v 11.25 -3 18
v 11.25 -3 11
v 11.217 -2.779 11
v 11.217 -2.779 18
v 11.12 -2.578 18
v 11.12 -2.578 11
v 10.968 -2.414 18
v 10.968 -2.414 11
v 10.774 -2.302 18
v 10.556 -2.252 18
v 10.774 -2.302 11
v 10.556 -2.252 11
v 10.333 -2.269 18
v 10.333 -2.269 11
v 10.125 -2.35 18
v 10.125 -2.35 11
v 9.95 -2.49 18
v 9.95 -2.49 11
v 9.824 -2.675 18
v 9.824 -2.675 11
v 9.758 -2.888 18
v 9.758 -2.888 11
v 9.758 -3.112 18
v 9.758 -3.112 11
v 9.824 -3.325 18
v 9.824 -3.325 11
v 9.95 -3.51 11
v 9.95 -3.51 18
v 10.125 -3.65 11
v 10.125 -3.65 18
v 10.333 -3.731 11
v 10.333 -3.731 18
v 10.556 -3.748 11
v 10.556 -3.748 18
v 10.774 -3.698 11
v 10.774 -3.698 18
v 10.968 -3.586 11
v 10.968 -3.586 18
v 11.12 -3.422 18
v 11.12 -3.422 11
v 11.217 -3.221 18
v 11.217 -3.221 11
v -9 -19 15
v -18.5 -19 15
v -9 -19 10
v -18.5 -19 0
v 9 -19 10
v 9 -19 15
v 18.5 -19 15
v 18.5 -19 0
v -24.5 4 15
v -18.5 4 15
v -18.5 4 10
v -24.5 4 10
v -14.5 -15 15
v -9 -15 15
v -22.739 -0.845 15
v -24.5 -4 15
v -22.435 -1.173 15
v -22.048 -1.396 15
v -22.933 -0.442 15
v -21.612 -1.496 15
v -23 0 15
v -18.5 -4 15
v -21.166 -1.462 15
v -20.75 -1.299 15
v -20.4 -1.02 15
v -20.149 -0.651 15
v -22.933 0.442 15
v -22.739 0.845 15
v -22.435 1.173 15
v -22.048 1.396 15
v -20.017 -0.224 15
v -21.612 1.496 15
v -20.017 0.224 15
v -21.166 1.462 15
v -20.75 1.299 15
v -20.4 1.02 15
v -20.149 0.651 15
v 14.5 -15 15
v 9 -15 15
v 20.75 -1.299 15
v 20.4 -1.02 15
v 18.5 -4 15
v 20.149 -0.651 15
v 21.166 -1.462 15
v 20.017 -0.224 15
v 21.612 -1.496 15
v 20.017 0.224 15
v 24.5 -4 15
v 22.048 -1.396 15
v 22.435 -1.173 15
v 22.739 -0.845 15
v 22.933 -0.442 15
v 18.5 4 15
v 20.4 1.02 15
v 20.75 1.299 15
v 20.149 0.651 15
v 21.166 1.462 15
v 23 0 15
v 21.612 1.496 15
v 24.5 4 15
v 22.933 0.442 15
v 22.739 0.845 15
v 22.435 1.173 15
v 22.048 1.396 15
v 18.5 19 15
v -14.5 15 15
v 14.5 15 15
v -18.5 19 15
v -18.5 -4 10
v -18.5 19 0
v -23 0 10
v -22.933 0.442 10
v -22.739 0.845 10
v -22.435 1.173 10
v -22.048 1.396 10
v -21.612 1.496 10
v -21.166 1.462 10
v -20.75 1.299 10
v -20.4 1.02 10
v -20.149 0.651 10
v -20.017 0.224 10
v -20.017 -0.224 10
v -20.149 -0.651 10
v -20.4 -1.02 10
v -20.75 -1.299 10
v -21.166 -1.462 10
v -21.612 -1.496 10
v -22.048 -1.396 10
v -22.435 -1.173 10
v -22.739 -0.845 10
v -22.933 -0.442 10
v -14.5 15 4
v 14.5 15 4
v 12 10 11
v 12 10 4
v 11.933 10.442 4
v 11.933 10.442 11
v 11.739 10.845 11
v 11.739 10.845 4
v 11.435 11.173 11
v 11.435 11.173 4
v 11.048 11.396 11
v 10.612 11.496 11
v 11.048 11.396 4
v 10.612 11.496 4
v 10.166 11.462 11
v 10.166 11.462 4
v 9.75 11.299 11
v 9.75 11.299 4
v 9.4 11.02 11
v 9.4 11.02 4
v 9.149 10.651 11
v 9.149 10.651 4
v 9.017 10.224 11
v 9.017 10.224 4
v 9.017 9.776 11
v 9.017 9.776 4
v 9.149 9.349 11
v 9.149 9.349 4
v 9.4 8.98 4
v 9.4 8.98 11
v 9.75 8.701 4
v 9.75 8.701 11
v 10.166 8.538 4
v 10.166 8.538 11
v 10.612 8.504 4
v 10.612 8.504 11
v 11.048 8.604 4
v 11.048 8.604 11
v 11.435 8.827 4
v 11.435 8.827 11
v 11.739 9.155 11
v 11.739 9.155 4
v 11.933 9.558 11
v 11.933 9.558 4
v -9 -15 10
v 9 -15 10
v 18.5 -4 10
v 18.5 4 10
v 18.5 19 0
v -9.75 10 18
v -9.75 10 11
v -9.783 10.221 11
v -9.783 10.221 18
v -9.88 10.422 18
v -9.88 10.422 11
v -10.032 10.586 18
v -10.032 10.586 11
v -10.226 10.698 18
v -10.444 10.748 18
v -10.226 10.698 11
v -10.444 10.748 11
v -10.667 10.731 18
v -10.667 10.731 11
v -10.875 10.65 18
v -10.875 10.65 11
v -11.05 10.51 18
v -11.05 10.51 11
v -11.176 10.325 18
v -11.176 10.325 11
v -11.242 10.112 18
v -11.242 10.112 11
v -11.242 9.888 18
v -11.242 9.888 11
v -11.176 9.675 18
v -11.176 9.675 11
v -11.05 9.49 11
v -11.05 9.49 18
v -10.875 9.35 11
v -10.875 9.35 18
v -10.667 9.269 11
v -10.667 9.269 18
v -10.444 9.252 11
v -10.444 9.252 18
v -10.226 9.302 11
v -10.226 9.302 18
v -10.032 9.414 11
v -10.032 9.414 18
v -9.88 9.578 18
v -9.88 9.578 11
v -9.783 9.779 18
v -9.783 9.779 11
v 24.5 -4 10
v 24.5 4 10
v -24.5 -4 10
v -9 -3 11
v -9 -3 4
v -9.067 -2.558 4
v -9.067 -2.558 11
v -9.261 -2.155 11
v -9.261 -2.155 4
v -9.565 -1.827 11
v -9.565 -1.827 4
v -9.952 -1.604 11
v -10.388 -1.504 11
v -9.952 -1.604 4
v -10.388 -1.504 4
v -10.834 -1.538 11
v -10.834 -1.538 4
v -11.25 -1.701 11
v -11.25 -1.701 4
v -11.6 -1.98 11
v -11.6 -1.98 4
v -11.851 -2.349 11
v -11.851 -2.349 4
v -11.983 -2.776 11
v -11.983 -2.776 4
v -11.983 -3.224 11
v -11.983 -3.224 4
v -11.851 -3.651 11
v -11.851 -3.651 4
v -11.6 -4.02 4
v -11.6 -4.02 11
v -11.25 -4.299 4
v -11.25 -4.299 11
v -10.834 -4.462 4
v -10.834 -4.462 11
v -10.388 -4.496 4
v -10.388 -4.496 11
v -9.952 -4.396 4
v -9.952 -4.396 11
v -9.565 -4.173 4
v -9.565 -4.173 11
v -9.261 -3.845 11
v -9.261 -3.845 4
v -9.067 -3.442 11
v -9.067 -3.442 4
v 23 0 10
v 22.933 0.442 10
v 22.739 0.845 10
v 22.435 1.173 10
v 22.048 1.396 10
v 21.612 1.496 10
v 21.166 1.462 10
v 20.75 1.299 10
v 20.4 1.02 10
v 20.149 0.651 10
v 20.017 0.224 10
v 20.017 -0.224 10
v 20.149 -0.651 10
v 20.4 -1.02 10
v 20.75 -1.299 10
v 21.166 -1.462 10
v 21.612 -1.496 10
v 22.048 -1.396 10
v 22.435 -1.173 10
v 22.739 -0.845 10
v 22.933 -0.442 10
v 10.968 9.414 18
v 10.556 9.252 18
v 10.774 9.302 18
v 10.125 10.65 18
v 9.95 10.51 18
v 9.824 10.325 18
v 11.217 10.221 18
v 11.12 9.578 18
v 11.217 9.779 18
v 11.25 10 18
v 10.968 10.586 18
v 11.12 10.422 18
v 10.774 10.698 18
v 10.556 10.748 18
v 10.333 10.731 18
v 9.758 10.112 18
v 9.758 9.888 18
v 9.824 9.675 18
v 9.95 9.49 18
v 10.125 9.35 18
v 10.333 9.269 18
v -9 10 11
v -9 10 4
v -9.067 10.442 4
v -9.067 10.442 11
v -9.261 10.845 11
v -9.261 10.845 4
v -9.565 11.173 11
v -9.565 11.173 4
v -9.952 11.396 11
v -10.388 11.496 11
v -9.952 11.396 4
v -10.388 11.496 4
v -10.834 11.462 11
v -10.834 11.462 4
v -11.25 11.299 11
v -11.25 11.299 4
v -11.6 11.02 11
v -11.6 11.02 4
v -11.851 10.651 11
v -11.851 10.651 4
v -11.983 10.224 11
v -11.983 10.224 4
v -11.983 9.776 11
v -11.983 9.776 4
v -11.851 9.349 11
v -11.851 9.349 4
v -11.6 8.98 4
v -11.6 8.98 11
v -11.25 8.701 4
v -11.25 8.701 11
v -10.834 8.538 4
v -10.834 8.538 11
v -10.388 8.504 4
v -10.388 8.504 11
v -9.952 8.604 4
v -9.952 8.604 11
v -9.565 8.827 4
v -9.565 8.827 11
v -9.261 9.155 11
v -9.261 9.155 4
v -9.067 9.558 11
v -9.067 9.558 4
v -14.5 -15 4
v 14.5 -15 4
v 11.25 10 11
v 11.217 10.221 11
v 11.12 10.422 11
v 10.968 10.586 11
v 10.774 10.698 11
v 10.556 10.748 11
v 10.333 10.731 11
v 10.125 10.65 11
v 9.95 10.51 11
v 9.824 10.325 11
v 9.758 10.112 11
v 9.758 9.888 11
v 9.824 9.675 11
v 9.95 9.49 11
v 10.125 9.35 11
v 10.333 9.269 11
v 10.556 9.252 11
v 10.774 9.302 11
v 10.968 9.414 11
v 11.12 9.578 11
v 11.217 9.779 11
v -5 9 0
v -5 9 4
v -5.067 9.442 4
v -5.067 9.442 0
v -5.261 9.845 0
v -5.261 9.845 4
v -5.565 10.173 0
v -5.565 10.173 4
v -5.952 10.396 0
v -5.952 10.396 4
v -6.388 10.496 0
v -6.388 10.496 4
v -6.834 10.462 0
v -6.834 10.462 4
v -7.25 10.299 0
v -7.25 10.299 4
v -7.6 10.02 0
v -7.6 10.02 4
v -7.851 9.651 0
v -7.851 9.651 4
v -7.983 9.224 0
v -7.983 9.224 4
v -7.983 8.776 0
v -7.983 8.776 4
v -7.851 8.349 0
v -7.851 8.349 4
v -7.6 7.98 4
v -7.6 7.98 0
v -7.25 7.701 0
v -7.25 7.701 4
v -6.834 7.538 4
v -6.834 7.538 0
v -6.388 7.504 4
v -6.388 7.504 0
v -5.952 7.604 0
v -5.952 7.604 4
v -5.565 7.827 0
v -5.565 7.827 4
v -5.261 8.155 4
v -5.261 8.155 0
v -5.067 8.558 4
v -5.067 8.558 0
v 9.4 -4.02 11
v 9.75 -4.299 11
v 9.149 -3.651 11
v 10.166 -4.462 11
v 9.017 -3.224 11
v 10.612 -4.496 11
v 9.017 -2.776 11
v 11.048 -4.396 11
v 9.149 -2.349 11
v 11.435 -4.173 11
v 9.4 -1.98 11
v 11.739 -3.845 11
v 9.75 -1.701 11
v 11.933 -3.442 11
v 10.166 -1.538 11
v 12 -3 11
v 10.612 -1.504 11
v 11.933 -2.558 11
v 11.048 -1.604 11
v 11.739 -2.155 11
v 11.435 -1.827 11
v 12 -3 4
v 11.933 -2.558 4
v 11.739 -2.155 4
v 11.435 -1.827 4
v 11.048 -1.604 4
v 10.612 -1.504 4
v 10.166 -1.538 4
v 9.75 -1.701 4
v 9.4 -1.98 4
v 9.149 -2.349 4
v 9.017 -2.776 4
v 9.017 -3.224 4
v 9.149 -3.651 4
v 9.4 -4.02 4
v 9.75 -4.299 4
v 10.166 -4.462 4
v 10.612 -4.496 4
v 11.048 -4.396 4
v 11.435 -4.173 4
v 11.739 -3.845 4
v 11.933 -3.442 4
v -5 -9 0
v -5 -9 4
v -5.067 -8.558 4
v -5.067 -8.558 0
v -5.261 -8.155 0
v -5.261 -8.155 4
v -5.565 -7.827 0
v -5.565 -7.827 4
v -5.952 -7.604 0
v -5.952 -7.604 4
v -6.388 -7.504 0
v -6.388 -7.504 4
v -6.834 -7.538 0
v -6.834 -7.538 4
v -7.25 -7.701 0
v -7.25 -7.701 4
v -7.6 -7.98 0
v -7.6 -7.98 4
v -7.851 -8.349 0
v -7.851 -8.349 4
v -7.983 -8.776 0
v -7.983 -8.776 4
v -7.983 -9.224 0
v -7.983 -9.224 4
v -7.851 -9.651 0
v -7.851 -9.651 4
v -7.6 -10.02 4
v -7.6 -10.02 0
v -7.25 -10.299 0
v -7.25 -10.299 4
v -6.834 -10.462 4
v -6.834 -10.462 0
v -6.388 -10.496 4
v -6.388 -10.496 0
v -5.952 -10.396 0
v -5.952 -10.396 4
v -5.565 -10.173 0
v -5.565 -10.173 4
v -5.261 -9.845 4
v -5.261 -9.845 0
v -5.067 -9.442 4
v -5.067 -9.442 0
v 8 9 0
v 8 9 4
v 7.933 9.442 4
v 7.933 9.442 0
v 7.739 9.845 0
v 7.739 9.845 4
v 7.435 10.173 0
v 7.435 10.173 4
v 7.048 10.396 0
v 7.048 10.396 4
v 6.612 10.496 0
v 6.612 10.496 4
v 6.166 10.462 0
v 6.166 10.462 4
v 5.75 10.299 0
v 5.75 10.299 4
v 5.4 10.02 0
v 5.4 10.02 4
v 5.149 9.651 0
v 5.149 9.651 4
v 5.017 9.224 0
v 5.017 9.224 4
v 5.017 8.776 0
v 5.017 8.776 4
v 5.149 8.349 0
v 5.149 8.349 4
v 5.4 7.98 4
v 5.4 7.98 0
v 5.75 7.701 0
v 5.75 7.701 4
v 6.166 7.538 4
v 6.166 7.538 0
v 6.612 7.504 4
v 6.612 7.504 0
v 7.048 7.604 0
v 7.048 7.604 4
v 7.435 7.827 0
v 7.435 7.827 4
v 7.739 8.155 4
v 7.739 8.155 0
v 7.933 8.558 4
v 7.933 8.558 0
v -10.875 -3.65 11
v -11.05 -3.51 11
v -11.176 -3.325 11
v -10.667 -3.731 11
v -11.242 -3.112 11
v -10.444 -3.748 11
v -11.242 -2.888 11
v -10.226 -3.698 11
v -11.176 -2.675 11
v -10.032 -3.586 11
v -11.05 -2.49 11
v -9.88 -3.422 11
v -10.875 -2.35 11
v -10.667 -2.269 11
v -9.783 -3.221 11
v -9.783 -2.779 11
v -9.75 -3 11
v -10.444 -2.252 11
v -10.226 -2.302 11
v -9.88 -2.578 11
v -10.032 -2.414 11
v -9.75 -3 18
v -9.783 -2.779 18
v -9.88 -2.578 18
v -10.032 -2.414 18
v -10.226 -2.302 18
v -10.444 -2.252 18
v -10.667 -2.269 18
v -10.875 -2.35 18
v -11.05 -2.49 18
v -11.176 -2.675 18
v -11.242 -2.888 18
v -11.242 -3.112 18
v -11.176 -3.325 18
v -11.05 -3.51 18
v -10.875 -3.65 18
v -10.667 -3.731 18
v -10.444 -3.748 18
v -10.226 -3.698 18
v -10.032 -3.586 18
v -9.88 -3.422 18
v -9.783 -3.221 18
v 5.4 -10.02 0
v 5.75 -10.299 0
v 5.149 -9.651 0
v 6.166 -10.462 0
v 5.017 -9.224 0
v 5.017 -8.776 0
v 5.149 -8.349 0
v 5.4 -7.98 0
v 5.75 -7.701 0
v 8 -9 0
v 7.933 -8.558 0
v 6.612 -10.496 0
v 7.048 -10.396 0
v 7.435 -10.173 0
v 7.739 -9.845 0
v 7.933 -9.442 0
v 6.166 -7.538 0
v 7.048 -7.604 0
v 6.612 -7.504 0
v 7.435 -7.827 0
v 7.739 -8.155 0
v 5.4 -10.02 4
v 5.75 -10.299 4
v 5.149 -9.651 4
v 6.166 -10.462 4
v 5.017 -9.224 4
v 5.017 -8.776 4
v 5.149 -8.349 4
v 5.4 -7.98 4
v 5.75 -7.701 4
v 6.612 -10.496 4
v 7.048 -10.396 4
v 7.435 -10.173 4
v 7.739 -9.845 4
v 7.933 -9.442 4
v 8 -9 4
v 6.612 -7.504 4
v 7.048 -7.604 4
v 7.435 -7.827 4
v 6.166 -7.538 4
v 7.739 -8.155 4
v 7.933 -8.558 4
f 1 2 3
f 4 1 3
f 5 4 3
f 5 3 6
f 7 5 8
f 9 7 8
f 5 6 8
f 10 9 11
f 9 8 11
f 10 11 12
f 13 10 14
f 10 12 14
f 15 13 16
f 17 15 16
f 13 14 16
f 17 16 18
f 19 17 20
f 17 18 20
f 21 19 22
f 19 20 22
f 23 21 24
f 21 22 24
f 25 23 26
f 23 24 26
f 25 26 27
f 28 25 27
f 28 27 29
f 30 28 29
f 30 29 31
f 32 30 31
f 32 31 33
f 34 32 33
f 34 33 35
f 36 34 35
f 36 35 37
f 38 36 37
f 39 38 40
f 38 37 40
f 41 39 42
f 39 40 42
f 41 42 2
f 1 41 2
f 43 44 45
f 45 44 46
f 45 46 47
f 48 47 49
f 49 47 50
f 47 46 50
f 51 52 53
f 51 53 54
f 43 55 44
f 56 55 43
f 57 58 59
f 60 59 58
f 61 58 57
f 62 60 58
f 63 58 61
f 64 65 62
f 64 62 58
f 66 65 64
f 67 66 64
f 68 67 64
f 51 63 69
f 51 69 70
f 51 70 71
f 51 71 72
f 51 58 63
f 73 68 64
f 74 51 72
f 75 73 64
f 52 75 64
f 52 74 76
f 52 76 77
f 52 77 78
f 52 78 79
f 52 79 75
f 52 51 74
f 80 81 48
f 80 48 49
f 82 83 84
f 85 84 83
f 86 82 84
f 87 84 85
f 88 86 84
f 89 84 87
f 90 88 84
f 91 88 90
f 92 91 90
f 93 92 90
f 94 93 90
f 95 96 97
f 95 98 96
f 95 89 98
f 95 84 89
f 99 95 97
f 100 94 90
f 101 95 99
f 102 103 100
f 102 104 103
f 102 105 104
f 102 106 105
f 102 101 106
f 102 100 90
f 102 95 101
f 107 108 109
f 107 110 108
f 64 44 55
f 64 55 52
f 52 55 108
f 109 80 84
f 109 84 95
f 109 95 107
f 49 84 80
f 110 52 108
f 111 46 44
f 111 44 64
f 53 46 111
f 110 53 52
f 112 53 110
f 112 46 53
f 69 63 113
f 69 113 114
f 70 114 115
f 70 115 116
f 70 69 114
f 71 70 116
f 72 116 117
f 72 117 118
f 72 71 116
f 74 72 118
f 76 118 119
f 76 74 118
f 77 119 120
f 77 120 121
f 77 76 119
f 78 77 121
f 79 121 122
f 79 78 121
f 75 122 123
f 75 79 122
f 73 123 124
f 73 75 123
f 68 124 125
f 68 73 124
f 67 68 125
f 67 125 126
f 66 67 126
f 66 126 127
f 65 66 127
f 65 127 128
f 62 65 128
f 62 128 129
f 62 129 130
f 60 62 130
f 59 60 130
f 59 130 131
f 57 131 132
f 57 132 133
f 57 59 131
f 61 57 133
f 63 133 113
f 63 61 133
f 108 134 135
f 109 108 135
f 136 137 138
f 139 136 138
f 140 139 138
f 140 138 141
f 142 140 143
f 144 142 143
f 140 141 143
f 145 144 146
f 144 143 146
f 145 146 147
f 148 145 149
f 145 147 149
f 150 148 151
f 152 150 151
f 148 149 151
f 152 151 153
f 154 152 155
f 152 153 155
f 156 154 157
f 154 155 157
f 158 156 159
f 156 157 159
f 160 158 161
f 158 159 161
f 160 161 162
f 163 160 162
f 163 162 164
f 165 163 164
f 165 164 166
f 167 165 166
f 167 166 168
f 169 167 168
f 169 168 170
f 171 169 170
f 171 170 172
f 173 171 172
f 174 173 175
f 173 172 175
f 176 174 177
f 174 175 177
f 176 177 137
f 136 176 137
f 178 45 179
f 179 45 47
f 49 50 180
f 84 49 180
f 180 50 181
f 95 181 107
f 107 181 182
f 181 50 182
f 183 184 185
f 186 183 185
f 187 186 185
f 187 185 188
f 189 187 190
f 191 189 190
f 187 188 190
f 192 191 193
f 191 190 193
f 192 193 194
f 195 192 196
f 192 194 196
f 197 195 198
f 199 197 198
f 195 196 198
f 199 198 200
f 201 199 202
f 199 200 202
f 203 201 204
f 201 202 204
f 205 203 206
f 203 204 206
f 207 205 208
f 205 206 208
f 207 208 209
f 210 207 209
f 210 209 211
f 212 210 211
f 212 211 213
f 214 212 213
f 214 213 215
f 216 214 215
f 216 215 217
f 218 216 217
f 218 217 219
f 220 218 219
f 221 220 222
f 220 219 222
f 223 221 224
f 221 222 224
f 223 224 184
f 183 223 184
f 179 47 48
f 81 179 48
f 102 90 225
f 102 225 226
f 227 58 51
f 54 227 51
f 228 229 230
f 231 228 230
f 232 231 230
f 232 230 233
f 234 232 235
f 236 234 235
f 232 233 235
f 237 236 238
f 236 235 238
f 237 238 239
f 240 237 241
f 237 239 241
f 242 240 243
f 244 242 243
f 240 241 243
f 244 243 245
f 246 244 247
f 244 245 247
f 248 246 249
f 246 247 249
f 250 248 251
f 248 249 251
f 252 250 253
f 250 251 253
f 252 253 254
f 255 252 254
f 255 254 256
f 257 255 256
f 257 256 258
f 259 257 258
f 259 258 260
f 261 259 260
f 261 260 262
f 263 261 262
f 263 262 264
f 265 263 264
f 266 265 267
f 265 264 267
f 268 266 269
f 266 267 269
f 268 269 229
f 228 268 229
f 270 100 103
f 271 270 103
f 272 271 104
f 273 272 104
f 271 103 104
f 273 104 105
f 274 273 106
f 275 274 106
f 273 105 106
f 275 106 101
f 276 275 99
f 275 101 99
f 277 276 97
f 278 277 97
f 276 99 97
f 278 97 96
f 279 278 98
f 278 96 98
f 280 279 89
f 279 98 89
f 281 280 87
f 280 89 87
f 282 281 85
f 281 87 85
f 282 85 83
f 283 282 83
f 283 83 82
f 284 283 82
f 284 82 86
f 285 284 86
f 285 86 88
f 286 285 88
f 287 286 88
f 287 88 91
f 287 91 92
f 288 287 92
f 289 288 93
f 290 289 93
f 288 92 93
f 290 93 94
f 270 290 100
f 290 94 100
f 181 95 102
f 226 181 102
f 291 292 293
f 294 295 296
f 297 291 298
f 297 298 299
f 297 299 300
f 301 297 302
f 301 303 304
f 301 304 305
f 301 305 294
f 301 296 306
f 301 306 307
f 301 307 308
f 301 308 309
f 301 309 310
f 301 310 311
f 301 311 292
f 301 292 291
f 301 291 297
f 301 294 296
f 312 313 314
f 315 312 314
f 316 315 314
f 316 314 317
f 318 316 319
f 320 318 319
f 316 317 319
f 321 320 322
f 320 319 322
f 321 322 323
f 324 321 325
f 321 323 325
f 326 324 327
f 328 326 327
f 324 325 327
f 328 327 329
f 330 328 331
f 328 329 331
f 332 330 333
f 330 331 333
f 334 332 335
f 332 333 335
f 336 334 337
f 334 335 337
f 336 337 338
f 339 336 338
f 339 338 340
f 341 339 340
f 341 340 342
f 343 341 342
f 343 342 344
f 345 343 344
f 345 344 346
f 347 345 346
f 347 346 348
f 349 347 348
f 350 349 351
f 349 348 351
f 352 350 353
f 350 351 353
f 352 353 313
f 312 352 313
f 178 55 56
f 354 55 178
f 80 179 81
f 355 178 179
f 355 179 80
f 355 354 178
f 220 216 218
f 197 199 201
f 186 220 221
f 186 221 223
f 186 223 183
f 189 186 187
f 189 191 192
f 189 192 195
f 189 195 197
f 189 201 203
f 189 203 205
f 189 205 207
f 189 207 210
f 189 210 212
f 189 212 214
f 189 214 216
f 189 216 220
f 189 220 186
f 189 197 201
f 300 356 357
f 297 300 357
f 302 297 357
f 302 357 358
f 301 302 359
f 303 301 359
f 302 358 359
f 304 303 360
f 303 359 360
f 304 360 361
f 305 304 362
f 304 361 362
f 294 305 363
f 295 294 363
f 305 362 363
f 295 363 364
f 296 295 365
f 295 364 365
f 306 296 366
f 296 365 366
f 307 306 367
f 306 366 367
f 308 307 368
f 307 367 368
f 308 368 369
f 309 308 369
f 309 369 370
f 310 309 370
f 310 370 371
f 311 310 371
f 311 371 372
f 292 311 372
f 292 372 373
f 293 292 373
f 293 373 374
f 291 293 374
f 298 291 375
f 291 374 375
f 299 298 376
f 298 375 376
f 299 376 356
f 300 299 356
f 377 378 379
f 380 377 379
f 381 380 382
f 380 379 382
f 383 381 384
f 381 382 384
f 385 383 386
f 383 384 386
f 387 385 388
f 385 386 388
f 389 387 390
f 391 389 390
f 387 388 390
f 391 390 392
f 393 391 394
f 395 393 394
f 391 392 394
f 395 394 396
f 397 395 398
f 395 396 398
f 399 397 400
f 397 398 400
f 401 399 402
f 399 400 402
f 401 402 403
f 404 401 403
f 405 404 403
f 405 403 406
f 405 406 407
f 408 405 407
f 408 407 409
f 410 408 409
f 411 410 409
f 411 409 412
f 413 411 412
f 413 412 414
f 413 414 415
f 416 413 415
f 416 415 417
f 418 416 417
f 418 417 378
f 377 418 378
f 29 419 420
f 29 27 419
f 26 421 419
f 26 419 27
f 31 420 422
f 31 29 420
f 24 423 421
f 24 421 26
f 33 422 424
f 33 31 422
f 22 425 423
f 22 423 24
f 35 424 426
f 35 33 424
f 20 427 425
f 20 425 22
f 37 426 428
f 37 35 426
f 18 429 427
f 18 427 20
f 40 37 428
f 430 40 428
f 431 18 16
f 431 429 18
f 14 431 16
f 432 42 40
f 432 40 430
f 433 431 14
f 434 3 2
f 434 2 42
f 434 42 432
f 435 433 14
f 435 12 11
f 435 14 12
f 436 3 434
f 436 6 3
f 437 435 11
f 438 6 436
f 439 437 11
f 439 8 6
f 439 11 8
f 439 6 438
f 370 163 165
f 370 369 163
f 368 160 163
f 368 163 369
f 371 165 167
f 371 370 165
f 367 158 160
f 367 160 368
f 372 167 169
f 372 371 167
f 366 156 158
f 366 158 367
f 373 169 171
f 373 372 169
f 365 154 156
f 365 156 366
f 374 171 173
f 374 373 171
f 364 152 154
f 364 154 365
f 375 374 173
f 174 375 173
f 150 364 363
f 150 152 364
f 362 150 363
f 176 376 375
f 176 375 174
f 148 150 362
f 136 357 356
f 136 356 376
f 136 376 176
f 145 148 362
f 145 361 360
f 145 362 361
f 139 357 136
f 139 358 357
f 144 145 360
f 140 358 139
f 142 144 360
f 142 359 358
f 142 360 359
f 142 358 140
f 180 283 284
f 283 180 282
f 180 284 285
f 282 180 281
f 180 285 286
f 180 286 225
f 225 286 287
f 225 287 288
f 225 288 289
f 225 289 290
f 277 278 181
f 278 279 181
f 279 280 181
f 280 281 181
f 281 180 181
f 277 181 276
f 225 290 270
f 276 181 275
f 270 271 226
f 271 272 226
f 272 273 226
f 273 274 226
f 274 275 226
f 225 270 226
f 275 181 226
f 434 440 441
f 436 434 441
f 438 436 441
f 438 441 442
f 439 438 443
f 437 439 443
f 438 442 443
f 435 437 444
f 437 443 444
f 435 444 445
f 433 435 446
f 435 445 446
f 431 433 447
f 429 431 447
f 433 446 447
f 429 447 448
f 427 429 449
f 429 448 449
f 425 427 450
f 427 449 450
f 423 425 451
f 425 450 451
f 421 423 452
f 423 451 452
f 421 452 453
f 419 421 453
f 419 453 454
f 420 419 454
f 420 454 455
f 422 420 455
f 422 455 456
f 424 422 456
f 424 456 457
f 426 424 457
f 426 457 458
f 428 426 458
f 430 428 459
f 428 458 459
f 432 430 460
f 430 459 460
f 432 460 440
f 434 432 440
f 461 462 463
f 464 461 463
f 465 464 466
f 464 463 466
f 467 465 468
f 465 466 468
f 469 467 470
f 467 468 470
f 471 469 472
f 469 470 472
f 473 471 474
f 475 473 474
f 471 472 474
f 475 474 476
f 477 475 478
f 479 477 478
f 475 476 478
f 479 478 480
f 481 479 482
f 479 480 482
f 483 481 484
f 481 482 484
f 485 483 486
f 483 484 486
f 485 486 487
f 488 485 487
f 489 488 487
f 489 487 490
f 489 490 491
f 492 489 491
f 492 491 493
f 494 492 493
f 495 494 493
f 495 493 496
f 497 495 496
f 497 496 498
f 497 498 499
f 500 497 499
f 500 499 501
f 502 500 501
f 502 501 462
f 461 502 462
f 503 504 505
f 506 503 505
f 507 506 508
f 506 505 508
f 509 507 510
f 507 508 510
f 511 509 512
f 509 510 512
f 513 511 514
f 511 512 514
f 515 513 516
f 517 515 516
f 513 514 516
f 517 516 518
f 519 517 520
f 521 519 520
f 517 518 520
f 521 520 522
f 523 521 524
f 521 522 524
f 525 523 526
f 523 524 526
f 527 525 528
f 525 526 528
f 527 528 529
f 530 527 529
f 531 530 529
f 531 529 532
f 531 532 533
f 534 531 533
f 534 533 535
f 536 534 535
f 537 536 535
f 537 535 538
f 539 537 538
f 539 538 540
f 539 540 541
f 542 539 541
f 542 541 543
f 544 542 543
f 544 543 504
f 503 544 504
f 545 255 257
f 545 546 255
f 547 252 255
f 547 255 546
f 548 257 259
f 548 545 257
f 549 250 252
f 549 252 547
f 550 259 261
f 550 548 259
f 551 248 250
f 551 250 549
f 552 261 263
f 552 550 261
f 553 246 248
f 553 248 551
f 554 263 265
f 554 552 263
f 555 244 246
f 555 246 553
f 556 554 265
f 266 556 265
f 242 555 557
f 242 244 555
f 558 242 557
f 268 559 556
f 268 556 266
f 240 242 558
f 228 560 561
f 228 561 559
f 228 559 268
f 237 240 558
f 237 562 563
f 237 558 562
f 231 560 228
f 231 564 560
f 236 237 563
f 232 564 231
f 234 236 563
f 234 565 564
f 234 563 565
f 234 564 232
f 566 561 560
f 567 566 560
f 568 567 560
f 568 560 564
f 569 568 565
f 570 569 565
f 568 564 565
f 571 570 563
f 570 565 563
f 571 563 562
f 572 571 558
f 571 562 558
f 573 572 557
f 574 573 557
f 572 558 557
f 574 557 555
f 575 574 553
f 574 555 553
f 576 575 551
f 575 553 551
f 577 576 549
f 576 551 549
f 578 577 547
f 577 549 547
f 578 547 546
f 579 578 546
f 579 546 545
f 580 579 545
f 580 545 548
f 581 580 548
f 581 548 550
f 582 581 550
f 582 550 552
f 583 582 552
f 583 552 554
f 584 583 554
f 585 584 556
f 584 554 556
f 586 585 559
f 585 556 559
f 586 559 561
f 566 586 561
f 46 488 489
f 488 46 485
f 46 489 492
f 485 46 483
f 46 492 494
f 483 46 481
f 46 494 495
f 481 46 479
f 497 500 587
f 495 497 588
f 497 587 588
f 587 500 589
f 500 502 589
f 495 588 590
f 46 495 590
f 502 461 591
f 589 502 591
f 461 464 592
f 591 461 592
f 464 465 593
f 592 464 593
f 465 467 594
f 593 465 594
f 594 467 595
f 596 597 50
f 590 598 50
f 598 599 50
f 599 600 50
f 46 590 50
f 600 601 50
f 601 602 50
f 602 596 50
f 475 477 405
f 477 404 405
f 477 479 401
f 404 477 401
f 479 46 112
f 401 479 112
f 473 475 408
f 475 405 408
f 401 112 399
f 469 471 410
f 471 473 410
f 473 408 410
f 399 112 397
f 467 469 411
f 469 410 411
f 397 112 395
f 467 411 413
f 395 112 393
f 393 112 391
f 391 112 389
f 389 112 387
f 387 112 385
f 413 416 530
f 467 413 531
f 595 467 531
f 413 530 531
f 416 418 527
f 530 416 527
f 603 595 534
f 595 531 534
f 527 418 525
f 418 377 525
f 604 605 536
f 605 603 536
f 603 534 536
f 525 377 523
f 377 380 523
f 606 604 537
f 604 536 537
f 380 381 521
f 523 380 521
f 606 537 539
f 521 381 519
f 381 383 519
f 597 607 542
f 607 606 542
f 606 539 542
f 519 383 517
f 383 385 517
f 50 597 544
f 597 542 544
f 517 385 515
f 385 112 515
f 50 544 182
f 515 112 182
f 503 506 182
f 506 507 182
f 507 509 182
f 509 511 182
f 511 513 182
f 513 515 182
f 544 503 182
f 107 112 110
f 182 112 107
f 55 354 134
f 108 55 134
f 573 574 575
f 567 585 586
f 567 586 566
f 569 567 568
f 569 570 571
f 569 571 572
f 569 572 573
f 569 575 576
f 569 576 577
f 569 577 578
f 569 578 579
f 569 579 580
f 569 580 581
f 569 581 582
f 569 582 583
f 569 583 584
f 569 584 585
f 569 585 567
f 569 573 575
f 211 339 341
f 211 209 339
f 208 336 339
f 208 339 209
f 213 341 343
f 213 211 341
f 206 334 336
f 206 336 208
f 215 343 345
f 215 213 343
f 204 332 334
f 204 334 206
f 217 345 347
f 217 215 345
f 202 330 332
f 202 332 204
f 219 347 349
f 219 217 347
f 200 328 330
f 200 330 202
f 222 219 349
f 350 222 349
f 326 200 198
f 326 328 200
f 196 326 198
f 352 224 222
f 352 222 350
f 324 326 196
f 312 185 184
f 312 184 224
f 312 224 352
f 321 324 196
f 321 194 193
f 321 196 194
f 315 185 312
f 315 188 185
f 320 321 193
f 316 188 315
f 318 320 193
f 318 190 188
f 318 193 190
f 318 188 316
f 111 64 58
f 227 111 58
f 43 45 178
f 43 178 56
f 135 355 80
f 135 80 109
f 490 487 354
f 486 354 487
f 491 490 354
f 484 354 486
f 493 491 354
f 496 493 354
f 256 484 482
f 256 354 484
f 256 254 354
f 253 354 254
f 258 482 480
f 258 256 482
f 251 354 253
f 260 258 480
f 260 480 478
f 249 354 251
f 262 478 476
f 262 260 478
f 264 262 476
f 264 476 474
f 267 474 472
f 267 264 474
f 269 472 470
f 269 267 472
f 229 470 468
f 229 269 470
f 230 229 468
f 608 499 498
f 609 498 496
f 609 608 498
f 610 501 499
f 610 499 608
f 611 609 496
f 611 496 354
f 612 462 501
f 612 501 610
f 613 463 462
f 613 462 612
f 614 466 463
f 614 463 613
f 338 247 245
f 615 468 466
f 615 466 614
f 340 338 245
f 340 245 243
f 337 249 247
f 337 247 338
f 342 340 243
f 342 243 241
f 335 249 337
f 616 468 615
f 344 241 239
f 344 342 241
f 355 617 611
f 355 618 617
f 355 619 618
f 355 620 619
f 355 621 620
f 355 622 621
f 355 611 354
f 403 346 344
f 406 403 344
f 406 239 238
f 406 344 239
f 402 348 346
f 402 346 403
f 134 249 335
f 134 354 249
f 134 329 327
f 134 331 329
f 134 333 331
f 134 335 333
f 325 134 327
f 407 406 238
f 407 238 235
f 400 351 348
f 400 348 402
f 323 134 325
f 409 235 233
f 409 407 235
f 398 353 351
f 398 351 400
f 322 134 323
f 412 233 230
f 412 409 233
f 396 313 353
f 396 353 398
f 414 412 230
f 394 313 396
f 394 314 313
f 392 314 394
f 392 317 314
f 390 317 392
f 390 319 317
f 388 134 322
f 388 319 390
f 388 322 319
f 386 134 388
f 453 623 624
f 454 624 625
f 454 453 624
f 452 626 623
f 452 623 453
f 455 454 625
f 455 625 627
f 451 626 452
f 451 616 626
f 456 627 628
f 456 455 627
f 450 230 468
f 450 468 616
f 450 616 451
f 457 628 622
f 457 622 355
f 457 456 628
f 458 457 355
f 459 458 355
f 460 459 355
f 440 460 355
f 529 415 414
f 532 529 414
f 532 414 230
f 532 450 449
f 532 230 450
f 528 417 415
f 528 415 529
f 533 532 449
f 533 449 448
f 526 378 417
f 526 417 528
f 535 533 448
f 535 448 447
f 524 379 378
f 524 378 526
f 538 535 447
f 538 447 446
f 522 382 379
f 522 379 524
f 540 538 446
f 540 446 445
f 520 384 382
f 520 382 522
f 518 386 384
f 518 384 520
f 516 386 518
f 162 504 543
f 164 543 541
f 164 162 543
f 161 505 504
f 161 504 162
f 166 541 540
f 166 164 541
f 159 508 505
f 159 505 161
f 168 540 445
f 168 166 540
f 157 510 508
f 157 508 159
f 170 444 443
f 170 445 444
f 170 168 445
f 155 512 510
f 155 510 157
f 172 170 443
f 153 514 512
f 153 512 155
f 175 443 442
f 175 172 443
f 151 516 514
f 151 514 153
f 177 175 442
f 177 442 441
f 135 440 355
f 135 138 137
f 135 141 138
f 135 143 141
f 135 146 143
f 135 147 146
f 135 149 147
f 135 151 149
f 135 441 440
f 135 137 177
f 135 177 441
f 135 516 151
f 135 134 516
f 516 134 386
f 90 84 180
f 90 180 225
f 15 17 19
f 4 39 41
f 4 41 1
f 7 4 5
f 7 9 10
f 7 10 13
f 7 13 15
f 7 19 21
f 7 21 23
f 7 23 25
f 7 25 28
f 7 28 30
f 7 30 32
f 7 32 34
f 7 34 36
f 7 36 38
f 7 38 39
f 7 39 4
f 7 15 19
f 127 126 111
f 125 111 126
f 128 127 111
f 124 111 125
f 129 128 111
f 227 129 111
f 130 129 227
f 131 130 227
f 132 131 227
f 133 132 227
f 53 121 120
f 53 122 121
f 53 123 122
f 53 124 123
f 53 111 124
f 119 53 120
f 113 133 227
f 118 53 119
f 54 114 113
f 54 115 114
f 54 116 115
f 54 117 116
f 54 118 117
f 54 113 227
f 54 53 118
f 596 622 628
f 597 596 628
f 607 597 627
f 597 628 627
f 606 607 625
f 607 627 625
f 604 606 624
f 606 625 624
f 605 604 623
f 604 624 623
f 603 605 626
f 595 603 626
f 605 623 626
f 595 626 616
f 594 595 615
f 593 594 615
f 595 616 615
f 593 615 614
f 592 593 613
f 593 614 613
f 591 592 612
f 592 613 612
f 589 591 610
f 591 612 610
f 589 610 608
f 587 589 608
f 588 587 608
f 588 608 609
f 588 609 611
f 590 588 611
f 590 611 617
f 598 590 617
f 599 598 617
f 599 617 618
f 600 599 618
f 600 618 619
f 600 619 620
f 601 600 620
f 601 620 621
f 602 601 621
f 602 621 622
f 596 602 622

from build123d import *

# Parameters (mm, degrees)
CROQUIS1_W              = 37
CROQUIS1_H              = 38
SALIENTE_EXTRUIR1_DEPTH = 15
VACIADO1_T              = -4
CROQUIS2_W              = 6
CROQUIS2_H              = 8
CROQUIS2_R              = 1.5
SALIENTE_EXTRUIR2_DEPTH = 5
CROQUIS3_W              = 18
CROQUIS3_H              = 5
CORTAR_EXTRUIR1_DEPTH   = 5
CROQUIS4_R              = 1.5
SALIENTE_EXTRUIR3_DEPTH = 7
CROQUIS5_R              = 0.75
SALIENTE_EXTRUIR4_DEPTH = 7
CROQUIS7_R              = 1.5
CORTAR_EXTRUIR2_DEPTH   = 7


with BuildPart() as part:
    # Croquis1 → Saliente-Extruir1 (new body)
    with BuildSketch(Plane.XY):
        Rectangle(CROQUIS1_W, CROQUIS1_H)
    extrude(amount=SALIENTE_EXTRUIR1_DEPTH)

    # Vaciado1
    vaciado1_openings = [part.faces().sort_by_distance(p)[0] for p in [
        (0, 0, 15),
    ]]
    offset(amount=VACIADO1_T, openings=vaciado1_openings, kind=Kind.INTERSECTION)

    # Croquis2 → Saliente-Extruir2 (add)
    with BuildSketch(Plane.XY.offset(15)):
        with Locations((21.5, 0)):
            Rectangle(CROQUIS2_W, CROQUIS2_H)
        with Locations((21.5, 0)):
            Circle(CROQUIS2_R, mode=Mode.SUBTRACT)
    saliente_extruir2 = extrude(amount=-SALIENTE_EXTRUIR2_DEPTH)

    # Simetría1: Saliente-Extruir2 across plane
    add(saliente_extruir2.mirror(Plane(origin=(0, 0, 0), x_dir=(0, 0, 1), z_dir=(1, 0, 0))))

    # Croquis3 → Cortar-Extruir1 (cut)
    with BuildSketch(Plane.XZ.offset(19)):
        with Locations((0, 12.5)):
            Rectangle(CROQUIS3_W, CROQUIS3_H)
    extrude(amount=-CORTAR_EXTRUIR1_DEPTH, mode=Mode.SUBTRACT)

    # Croquis4 → Saliente-Extruir3 (add)
    with BuildSketch(Plane.XY.offset(4)):
        with Locations((-10.5, 10)):
            Circle(CROQUIS4_R)
        with Locations((10.5, 10)):
            Circle(CROQUIS4_R)
        with Locations((10.5, -3)):
            Circle(CROQUIS4_R)
        with Locations((-10.5, -3)):
            Circle(CROQUIS4_R)
    extrude(amount=SALIENTE_EXTRUIR3_DEPTH)

    # Croquis5 → Saliente-Extruir4 (add)
    with BuildSketch(Plane.XY.offset(11)):
        with Locations((-10.5, 10)):
            Circle(CROQUIS5_R)
        with Locations((10.5, 10)):
            Circle(CROQUIS5_R)
        with Locations((10.5, -3)):
            Circle(CROQUIS5_R)
        with Locations((-10.5, -3)):
            Circle(CROQUIS5_R)
    extrude(amount=SALIENTE_EXTRUIR4_DEPTH)

    # Croquis7 → Cortar-Extruir2 (cut)
    with BuildSketch(Plane.XY.offset(4)):
        with Locations((-6.5, 9)):
            Circle(CROQUIS7_R)
        with Locations((6.5, 9)):
            Circle(CROQUIS7_R)
        with Locations((6.5, -9)):
            Circle(CROQUIS7_R)
        with Locations((-6.5, -9)):
            Circle(CROQUIS7_R)
    extrude(amount=-CORTAR_EXTRUIR2_DEPTH, mode=Mode.SUBTRACT)


solid = part.part
